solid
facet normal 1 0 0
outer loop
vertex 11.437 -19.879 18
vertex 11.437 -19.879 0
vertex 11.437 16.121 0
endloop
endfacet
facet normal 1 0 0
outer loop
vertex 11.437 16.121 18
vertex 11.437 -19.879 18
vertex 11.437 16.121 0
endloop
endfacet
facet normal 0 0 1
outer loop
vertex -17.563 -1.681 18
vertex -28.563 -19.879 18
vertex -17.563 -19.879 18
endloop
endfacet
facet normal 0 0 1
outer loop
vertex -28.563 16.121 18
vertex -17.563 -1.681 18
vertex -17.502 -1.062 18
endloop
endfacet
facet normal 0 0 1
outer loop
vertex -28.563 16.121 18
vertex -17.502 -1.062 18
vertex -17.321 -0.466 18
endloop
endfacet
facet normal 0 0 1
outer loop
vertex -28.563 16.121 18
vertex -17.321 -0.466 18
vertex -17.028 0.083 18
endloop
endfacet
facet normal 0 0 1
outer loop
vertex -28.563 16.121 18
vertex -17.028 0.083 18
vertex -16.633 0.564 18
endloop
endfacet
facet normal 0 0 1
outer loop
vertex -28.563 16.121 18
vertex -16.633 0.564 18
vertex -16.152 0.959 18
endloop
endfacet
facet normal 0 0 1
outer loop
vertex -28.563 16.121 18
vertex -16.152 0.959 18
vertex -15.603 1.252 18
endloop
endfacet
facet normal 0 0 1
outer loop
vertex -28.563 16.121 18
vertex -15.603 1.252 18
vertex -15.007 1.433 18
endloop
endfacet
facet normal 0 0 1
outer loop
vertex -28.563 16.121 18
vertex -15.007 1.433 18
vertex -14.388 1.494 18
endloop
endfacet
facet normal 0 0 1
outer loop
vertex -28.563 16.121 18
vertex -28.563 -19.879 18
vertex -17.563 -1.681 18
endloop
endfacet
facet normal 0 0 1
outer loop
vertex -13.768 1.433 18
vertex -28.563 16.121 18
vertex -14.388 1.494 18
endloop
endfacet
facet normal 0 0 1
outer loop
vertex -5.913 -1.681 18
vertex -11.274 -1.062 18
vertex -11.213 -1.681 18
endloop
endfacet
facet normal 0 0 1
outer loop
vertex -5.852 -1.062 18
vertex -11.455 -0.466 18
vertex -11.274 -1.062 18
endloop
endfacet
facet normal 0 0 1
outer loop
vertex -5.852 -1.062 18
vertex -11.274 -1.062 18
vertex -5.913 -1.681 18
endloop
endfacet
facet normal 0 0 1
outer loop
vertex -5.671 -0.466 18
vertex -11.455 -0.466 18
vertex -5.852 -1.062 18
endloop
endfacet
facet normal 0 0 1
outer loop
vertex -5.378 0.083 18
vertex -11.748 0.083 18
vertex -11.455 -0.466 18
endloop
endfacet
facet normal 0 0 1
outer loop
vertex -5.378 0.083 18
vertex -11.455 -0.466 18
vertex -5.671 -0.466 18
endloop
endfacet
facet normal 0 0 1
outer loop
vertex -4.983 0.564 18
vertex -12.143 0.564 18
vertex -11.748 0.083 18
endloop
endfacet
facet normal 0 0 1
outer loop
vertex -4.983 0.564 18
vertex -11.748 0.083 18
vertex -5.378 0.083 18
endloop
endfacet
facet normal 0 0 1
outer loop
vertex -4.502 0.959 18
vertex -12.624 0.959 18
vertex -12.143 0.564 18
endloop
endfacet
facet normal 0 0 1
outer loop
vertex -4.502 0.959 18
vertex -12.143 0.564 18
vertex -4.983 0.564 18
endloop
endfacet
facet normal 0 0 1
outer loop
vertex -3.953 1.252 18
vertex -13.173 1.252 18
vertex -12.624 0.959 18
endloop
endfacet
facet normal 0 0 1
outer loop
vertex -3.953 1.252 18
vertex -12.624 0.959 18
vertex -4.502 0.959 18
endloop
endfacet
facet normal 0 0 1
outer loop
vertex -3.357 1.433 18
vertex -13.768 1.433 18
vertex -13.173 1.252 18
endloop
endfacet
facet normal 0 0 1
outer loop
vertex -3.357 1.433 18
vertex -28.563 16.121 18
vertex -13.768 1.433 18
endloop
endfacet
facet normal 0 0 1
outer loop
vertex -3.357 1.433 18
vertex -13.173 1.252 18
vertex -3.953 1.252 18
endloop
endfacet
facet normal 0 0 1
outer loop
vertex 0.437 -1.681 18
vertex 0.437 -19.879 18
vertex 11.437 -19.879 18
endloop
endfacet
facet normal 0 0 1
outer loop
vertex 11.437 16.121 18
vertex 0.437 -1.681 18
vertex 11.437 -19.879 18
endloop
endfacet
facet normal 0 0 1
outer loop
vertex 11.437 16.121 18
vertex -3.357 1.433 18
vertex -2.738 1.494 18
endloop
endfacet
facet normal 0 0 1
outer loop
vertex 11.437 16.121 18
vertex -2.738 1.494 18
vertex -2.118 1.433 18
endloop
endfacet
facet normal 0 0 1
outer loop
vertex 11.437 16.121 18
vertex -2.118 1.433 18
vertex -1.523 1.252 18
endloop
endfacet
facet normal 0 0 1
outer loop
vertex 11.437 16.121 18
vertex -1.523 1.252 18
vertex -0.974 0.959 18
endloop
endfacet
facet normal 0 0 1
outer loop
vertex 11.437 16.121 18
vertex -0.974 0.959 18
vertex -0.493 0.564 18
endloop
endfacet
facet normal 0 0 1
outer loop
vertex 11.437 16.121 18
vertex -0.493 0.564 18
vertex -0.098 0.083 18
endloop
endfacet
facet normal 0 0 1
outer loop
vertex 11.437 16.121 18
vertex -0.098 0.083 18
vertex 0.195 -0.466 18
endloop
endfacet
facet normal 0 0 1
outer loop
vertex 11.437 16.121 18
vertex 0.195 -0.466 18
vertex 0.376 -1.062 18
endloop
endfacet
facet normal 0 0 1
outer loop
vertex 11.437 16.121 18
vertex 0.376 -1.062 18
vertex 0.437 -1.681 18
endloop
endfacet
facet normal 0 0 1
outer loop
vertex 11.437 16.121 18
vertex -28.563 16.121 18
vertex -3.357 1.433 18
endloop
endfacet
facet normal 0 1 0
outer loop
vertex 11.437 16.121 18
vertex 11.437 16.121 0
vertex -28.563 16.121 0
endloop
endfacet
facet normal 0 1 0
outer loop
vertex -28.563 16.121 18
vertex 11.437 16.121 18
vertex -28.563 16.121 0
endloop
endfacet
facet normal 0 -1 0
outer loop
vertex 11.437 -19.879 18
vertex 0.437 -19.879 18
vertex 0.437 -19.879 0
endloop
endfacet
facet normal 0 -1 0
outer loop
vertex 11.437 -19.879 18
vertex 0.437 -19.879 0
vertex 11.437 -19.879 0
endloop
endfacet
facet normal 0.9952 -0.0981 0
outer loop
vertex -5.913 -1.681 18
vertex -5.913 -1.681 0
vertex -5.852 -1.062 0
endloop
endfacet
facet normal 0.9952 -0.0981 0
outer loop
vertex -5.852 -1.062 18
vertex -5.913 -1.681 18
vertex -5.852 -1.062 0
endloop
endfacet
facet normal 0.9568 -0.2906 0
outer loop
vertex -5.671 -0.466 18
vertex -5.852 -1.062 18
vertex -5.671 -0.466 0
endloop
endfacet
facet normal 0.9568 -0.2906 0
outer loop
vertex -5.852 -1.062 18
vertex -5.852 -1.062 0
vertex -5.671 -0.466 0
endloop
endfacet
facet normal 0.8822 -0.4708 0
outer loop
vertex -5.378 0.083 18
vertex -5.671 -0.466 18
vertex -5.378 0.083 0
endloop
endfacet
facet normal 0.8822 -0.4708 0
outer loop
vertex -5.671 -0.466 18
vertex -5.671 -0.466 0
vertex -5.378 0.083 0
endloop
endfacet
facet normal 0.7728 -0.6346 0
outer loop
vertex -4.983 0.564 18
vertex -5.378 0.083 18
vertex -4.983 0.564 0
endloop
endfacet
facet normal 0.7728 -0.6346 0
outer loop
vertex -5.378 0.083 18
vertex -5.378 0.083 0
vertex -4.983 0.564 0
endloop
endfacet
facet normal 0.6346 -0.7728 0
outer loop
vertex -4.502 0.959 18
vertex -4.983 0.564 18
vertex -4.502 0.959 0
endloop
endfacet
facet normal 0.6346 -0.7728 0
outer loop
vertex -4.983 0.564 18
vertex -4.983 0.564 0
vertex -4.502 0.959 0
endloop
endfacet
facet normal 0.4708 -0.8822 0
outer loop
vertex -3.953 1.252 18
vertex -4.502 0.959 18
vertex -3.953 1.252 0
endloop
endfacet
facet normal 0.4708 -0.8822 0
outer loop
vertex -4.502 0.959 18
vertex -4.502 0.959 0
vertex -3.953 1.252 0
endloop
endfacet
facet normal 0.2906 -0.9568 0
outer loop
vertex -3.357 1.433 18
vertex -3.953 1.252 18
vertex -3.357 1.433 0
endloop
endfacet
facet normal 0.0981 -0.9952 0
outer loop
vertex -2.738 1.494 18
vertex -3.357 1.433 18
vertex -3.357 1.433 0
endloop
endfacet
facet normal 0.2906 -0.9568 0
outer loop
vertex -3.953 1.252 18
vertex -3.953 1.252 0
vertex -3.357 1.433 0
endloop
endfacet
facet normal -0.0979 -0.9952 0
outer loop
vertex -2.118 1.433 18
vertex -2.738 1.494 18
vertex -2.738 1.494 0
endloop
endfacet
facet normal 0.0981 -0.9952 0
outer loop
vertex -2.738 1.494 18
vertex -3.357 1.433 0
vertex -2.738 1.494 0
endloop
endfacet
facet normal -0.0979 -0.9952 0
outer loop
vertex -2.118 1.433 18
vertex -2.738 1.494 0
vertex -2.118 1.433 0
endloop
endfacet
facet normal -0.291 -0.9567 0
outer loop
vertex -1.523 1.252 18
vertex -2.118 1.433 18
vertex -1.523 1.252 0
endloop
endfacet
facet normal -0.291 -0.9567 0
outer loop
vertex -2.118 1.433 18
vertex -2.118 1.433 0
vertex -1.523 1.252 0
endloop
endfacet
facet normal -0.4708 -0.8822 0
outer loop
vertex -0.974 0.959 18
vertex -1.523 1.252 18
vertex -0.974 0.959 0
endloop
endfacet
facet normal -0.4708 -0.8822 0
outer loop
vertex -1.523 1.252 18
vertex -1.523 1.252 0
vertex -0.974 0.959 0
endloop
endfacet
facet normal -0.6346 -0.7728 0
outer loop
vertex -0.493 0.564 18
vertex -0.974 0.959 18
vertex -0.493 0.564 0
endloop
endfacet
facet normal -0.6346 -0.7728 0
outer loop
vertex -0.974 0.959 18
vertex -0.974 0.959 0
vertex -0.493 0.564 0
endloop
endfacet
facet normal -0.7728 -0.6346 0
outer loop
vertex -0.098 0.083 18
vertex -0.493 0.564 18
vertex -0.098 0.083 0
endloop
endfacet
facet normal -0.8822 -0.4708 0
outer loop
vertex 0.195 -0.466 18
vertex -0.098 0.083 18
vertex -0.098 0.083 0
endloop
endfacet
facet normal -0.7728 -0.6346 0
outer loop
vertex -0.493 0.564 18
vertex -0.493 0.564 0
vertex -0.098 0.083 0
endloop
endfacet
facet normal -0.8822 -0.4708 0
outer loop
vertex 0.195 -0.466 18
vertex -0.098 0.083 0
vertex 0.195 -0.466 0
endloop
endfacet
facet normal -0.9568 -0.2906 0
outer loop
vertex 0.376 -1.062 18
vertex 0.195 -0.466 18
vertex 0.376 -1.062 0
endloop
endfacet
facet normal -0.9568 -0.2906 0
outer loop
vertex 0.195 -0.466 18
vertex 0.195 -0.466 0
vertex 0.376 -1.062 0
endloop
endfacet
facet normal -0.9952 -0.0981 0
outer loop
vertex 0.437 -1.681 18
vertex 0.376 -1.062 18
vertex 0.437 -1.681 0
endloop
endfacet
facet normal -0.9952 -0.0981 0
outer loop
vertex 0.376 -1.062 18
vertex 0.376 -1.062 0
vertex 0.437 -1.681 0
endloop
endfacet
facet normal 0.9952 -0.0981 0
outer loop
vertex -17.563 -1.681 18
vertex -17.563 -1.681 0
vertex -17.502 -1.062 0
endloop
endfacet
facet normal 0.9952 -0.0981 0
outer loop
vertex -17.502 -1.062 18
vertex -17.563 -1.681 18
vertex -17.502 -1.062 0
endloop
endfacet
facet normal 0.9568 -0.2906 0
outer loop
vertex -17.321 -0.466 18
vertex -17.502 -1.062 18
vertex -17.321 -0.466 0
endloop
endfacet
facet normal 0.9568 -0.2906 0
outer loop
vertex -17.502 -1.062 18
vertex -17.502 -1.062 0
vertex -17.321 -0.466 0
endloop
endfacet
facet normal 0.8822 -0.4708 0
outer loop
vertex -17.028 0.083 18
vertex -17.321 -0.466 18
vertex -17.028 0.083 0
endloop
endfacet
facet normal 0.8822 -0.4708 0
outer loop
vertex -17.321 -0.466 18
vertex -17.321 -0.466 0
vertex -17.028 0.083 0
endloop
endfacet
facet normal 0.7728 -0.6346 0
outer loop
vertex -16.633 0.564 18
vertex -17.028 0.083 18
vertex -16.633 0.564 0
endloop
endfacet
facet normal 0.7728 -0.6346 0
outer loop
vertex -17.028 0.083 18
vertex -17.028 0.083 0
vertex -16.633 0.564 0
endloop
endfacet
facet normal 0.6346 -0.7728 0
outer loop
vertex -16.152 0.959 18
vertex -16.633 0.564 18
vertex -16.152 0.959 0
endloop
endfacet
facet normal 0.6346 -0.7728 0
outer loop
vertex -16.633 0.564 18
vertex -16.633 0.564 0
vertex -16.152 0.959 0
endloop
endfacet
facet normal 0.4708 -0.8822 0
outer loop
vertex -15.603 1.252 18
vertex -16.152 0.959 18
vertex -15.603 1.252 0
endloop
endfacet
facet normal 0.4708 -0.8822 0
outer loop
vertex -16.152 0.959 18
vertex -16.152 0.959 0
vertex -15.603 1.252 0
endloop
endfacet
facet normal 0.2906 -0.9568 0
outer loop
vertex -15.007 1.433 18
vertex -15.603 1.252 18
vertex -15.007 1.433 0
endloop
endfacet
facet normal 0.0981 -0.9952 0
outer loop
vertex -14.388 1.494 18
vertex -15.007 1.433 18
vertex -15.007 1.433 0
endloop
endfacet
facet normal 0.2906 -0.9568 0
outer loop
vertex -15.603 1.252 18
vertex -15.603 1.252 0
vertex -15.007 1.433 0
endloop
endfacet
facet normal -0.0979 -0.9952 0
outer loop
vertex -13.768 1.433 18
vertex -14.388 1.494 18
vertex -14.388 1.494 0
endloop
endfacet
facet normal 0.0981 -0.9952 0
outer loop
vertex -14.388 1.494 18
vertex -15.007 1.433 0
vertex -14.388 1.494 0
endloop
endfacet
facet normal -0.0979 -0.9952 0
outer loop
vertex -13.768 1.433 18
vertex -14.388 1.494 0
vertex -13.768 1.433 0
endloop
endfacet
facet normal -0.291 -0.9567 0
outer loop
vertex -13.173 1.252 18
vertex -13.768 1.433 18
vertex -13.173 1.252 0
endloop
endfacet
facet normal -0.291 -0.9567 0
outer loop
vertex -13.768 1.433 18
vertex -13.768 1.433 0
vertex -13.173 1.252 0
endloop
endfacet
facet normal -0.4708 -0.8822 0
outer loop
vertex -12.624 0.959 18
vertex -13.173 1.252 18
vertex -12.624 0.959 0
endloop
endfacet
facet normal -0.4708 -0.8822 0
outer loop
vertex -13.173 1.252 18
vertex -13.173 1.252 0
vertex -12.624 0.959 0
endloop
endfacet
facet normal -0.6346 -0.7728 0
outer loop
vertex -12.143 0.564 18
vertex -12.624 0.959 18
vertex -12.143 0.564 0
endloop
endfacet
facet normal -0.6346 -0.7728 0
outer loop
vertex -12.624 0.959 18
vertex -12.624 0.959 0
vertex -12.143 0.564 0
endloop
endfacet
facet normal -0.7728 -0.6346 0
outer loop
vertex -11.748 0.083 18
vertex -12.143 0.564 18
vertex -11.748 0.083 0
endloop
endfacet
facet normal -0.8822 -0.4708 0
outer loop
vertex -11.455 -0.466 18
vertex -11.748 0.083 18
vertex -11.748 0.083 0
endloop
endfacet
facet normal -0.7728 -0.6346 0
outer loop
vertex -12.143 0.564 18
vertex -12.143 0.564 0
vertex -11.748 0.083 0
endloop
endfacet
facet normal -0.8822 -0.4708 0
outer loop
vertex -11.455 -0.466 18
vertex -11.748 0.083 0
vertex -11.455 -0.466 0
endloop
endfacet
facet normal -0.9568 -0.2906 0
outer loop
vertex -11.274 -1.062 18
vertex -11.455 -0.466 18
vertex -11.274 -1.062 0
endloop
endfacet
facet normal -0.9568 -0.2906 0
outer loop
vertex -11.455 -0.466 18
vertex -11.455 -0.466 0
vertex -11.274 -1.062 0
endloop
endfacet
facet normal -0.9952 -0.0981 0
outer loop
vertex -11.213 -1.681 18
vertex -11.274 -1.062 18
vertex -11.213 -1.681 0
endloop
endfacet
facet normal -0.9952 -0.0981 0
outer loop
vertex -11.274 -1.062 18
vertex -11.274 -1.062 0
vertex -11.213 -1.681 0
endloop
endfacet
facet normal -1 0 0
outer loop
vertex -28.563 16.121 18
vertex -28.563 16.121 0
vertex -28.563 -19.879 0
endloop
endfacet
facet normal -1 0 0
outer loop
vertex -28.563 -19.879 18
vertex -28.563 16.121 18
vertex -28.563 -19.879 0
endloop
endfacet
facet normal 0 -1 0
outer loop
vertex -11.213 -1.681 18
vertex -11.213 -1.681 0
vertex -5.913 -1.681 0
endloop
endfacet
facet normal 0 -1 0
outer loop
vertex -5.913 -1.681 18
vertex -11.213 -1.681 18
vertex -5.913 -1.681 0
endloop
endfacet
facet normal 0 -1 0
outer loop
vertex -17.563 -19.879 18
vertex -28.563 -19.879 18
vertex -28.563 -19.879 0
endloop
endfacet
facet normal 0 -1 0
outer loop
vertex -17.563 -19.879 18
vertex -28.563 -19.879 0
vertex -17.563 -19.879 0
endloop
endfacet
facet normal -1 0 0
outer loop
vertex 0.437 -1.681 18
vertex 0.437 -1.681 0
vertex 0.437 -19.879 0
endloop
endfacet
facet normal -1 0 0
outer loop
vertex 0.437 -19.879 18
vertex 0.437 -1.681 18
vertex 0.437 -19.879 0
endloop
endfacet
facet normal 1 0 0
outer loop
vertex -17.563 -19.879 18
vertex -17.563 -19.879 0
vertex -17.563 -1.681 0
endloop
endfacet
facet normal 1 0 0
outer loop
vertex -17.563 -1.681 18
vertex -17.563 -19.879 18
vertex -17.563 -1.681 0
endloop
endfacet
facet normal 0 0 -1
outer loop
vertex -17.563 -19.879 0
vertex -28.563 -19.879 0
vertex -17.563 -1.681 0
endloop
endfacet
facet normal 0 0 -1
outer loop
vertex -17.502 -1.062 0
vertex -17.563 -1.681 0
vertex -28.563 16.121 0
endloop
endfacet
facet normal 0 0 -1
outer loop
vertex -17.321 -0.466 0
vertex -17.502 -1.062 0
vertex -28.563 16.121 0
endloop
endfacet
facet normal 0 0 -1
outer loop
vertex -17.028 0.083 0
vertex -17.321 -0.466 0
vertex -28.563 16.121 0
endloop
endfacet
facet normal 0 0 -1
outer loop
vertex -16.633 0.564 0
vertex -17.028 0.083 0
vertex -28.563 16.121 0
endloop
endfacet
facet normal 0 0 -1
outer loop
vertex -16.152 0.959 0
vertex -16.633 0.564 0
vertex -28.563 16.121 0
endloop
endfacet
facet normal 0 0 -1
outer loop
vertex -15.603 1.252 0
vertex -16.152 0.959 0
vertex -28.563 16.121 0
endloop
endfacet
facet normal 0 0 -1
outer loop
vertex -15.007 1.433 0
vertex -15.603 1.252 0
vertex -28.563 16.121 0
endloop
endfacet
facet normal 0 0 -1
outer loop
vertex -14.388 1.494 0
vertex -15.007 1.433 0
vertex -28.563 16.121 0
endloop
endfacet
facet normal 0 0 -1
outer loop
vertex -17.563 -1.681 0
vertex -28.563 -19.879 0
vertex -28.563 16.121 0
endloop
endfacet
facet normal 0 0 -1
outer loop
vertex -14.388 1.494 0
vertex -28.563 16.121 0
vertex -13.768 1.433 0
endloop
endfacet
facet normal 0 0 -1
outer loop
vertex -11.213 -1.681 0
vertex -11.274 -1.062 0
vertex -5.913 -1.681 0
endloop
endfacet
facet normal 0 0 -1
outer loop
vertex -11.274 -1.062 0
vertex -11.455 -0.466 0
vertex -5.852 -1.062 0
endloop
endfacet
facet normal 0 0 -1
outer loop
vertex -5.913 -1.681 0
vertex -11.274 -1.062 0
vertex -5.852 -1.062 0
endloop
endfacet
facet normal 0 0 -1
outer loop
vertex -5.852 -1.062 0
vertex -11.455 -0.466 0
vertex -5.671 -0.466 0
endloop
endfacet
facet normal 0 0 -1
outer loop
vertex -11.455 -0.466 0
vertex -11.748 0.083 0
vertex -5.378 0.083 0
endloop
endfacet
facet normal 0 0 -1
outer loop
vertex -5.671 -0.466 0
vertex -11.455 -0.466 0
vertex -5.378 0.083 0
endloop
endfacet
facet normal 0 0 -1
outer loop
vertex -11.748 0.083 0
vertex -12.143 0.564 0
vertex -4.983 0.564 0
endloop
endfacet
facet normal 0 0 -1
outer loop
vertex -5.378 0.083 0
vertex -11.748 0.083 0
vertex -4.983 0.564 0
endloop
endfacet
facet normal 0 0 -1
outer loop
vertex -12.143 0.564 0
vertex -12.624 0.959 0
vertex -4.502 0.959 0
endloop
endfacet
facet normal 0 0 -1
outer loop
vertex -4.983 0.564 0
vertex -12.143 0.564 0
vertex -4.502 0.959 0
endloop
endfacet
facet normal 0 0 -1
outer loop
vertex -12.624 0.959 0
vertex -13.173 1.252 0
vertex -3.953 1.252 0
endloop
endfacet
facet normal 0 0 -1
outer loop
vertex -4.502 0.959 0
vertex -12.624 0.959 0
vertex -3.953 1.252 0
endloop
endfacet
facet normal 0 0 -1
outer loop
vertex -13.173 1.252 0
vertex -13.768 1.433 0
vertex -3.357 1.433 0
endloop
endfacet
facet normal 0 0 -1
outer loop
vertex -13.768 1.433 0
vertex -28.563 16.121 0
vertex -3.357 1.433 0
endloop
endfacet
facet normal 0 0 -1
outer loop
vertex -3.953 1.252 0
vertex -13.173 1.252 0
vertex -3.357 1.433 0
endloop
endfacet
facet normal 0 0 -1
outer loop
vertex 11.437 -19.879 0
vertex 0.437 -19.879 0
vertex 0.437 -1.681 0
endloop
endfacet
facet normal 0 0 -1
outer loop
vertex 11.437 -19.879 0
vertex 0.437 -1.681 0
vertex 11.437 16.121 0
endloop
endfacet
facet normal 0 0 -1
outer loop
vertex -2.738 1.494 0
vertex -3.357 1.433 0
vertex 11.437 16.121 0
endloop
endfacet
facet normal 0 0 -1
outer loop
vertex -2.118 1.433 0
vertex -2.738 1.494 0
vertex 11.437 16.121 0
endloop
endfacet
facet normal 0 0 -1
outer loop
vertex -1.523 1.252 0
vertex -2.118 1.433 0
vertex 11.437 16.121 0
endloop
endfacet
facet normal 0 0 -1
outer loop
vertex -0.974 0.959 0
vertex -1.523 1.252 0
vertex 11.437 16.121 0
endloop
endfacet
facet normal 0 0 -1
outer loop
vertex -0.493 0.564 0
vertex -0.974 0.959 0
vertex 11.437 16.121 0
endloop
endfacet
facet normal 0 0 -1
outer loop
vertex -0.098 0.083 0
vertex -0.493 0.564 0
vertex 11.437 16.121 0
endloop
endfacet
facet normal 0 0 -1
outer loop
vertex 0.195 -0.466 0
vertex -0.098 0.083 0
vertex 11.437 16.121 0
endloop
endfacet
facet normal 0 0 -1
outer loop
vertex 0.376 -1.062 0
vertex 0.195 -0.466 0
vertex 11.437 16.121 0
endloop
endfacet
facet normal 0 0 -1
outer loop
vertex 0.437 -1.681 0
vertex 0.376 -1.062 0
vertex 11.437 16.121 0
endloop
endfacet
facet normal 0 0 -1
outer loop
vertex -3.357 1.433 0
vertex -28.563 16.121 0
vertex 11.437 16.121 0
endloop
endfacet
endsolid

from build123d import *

# Parameters (mm, degrees)
ESTRUSIONE_ESTRUSIONE1_DEPTH = 18


with BuildPart() as part:
    # Schizzo1 → Estrusione-Estrusione1 (new body)
    with BuildSketch(Plane.XY):
        with BuildLine():
            Line((0.437175512, -19.879120879), (11.437175512, -19.879120879))
            Line((11.437175512, -19.879120879), (11.437175512, 16.120879121))
            Line((11.437175512, 16.120879121), (-28.562824488, 16.120879121))
            Line((-28.562824488, 16.120879121), (-28.562824488, -19.879120879))
            Line((-28.562824488, -19.879120879), (-17.562824488, -19.879120879))
            Line((-17.562824488, -19.879120879), (-17.562824488, -1.681318681))
            ThreePointArc((-17.562824488, -1.681318681), (-14.387824488, 1.493681319), (-11.212824488, -1.681318681))
            Line((-11.212824488, -1.681318681), (-5.912824488, -1.681318681))
            ThreePointArc((-5.912824488, -1.681318681), (-2.737824488, 1.493681319), (0.437175512, -1.681318681))
            Line((0.437175512, -1.681318681), (0.437175512, -19.879120879))
        make_face()
    extrude(amount=ESTRUSIONE_ESTRUSIONE1_DEPTH)


solid = part.part
